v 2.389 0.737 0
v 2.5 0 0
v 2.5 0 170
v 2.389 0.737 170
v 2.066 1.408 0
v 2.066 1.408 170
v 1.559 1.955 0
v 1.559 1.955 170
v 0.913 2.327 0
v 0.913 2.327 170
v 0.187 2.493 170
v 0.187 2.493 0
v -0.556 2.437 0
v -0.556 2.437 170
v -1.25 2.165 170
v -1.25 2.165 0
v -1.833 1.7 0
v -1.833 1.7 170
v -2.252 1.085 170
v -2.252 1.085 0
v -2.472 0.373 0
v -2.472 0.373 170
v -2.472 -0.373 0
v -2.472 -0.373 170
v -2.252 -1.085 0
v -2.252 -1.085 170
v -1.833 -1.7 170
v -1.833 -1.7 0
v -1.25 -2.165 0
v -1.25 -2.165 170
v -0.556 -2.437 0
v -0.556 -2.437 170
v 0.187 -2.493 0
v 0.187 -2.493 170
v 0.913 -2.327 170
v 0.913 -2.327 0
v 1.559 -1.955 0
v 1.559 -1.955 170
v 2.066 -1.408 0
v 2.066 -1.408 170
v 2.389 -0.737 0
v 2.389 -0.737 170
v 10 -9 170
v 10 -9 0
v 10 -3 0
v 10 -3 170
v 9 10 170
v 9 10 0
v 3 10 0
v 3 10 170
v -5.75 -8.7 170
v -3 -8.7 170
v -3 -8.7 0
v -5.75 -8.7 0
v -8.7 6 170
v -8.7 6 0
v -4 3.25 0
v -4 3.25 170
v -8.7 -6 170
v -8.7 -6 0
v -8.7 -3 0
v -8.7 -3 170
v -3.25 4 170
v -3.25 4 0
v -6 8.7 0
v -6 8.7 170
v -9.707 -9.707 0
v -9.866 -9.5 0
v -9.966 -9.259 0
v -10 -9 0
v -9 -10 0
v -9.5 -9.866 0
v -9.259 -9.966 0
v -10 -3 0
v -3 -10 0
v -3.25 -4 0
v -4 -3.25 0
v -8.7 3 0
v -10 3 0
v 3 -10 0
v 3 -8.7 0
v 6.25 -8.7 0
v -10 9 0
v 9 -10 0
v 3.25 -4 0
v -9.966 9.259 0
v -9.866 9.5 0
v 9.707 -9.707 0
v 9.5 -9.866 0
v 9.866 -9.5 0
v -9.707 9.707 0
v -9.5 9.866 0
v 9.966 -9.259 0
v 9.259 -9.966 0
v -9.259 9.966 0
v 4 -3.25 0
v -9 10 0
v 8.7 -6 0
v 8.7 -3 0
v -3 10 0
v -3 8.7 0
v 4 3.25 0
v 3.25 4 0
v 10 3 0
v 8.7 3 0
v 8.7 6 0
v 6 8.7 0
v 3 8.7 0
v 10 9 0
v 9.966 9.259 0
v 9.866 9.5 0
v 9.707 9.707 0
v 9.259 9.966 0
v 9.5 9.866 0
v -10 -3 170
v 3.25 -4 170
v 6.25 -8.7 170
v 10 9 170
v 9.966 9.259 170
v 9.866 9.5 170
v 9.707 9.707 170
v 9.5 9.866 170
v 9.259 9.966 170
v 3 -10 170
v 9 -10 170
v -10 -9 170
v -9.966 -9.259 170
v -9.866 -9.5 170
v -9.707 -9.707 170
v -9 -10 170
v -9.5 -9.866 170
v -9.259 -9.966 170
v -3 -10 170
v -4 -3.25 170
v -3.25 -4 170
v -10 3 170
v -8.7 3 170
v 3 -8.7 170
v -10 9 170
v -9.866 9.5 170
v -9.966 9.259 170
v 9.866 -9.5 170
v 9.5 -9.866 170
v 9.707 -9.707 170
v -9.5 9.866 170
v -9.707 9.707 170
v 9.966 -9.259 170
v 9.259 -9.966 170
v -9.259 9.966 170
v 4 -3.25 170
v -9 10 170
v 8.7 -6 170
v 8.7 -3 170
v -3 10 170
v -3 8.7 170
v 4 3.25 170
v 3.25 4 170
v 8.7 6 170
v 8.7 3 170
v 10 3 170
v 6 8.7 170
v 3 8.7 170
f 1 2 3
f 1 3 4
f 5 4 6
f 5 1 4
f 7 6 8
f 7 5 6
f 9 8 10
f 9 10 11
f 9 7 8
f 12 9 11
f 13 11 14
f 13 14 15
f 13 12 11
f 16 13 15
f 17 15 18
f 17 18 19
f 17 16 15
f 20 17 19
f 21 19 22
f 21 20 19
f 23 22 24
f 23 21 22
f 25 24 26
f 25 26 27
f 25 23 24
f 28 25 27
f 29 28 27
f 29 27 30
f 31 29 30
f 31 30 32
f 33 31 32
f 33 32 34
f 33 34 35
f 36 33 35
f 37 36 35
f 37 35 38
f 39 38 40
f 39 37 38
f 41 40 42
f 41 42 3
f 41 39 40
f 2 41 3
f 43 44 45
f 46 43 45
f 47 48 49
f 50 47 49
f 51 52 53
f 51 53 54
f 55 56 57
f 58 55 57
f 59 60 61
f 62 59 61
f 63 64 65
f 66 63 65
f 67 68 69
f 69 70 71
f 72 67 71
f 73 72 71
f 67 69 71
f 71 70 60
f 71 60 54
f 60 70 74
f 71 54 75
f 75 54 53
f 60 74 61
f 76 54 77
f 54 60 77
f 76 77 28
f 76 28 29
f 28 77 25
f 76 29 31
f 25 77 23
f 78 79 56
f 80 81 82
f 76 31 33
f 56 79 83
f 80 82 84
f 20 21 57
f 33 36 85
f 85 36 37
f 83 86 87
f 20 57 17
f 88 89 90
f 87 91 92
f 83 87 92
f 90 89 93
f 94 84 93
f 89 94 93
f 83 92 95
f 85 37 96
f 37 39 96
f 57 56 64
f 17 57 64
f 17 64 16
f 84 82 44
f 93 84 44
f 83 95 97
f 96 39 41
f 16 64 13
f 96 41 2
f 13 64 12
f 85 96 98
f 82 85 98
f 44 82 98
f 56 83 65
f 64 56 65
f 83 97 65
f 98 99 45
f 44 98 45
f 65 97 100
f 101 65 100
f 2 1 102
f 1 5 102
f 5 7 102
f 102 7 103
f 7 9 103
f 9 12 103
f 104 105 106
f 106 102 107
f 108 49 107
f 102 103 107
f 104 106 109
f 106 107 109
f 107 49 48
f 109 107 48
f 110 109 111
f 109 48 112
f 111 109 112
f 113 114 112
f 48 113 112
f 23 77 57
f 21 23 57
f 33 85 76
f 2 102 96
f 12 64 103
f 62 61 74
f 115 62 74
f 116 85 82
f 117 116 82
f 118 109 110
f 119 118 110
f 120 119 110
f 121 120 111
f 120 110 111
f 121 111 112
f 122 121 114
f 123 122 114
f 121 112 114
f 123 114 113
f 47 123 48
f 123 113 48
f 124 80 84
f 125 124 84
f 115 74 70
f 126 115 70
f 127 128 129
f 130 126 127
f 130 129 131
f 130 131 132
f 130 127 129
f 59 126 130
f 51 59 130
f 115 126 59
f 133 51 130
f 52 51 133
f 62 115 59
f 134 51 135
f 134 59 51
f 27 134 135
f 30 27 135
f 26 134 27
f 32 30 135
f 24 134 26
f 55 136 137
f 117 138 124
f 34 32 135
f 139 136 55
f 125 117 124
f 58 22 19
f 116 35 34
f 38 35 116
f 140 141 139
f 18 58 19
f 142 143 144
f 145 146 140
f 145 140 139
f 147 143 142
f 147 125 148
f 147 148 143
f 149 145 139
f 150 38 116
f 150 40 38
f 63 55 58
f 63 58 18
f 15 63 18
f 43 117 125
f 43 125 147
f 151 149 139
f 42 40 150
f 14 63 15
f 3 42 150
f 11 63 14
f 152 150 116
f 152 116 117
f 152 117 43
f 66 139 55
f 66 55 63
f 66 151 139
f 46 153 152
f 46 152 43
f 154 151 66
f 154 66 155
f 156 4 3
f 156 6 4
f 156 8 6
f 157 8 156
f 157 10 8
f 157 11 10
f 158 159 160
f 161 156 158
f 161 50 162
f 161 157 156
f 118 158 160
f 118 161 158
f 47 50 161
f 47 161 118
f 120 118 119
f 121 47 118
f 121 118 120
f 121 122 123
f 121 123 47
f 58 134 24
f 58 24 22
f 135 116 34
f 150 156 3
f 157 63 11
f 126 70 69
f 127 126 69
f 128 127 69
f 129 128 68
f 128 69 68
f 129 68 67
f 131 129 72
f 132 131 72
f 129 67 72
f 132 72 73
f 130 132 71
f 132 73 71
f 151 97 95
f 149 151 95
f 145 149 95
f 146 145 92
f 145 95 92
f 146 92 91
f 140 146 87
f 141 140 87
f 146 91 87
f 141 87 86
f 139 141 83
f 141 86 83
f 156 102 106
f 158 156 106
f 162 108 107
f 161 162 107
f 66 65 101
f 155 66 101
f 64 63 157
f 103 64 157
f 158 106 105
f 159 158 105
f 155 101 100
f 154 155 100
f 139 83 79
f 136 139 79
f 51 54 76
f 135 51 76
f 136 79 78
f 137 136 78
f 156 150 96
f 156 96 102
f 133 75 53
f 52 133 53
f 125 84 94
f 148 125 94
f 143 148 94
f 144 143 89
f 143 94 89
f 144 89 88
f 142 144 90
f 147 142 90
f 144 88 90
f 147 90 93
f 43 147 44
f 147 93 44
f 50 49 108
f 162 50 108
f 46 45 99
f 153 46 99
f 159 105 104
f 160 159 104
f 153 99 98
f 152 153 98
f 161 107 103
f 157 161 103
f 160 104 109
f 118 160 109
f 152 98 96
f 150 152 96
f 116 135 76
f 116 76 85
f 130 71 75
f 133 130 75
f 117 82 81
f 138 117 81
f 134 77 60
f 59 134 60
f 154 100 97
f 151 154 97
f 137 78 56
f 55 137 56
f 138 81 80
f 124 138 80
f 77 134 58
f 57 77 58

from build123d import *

# Parameters (mm, degrees)
CROQUIS1_W              = 8
CROQUIS1_H              = 8
CROQUIS1_R              = 2.5
SALIENTE_EXTRUIR4_DEPTH = 170


with BuildPart() as part:
    # Croquis1 → Saliente-Extruir4 (new body)
    with BuildSketch(Plane.XY):
        with BuildLine():
            Line((-3, 8.7), (-3, 10))
            Line((-3, 10), (-9, 10))
            ThreePointArc((-9, 10), (-9.707106781, 9.707106781), (-10, 9))
            Line((-10, 9), (-10, 3))
            Line((-10, 3), (-8.7, 3))
            Line((-8.7, 3), (-8.7, 6))
            Line((-8.7, 6), (-4, 3.25))
            Line((-4, 3.25), (-4, 4))
            Line((-4, 4), (-3.25, 4))
            Line((-3.25, 4), (-6, 8.7))
            Line((-6, 8.7), (-3, 8.7))
        make_face()
        with BuildLine():
            Line((9, 10), (3, 10))
            Line((3, 10), (3, 8.7))
            Line((3, 8.7), (6, 8.7))
            Line((6, 8.7), (3.25, 4))
            Line((3.25, 4), (4, 4))
            Line((4, 4), (4, 3.25))
            Line((4, 3.25), (8.7, 6))
            Line((8.7, 6), (8.7, 3))
            Line((8.7, 3), (10, 3))
            Line((10, 3), (10, 9))
            ThreePointArc((10, 9), (9.707106781, 9.707106781), (9, 10))
        make_face()
        with BuildLine():
            Line((10, -9), (10, -3))
            Line((10, -3), (8.7, -3))
            Line((8.7, -3), (8.7, -6))
            Line((8.7, -6), (4, -3.25))
            Line((4, -3.25), (4, -4))
            Line((4, -4), (3.25, -4))
            Line((3.25, -4), (6.25, -8.7))
            Line((6.25, -8.7), (3, -8.7))
            Line((3, -8.7), (3, -10))
            Line((3, -10), (9, -10))
            ThreePointArc((9, -10), (9.707106781, -9.707106781), (10, -9))
        make_face()
        with BuildLine():
            Line((-8.7, -3), (-10, -3))
            Line((-10, -3), (-10, -9))
            ThreePointArc((-10, -9), (-9.707106781, -9.707106781), (-9, -10))
            Line((-9, -10), (-3, -10))
            Line((-3, -10), (-3, -8.7))
            Line((-3, -8.7), (-5.75, -8.7))
            Line((-5.75, -8.7), (-3.25, -4))
            Line((-3.25, -4), (-4, -4))
            Line((-4, -4), (-4, -3.25))
            Line((-4, -3.25), (-8.7, -6))
            Line((-8.7, -6), (-8.7, -3))
        make_face()
        Rectangle(CROQUIS1_W, CROQUIS1_H)
        Circle(CROQUIS1_R, mode=Mode.SUBTRACT)
    extrude(amount=SALIENTE_EXTRUIR4_DEPTH)


solid = part.part
